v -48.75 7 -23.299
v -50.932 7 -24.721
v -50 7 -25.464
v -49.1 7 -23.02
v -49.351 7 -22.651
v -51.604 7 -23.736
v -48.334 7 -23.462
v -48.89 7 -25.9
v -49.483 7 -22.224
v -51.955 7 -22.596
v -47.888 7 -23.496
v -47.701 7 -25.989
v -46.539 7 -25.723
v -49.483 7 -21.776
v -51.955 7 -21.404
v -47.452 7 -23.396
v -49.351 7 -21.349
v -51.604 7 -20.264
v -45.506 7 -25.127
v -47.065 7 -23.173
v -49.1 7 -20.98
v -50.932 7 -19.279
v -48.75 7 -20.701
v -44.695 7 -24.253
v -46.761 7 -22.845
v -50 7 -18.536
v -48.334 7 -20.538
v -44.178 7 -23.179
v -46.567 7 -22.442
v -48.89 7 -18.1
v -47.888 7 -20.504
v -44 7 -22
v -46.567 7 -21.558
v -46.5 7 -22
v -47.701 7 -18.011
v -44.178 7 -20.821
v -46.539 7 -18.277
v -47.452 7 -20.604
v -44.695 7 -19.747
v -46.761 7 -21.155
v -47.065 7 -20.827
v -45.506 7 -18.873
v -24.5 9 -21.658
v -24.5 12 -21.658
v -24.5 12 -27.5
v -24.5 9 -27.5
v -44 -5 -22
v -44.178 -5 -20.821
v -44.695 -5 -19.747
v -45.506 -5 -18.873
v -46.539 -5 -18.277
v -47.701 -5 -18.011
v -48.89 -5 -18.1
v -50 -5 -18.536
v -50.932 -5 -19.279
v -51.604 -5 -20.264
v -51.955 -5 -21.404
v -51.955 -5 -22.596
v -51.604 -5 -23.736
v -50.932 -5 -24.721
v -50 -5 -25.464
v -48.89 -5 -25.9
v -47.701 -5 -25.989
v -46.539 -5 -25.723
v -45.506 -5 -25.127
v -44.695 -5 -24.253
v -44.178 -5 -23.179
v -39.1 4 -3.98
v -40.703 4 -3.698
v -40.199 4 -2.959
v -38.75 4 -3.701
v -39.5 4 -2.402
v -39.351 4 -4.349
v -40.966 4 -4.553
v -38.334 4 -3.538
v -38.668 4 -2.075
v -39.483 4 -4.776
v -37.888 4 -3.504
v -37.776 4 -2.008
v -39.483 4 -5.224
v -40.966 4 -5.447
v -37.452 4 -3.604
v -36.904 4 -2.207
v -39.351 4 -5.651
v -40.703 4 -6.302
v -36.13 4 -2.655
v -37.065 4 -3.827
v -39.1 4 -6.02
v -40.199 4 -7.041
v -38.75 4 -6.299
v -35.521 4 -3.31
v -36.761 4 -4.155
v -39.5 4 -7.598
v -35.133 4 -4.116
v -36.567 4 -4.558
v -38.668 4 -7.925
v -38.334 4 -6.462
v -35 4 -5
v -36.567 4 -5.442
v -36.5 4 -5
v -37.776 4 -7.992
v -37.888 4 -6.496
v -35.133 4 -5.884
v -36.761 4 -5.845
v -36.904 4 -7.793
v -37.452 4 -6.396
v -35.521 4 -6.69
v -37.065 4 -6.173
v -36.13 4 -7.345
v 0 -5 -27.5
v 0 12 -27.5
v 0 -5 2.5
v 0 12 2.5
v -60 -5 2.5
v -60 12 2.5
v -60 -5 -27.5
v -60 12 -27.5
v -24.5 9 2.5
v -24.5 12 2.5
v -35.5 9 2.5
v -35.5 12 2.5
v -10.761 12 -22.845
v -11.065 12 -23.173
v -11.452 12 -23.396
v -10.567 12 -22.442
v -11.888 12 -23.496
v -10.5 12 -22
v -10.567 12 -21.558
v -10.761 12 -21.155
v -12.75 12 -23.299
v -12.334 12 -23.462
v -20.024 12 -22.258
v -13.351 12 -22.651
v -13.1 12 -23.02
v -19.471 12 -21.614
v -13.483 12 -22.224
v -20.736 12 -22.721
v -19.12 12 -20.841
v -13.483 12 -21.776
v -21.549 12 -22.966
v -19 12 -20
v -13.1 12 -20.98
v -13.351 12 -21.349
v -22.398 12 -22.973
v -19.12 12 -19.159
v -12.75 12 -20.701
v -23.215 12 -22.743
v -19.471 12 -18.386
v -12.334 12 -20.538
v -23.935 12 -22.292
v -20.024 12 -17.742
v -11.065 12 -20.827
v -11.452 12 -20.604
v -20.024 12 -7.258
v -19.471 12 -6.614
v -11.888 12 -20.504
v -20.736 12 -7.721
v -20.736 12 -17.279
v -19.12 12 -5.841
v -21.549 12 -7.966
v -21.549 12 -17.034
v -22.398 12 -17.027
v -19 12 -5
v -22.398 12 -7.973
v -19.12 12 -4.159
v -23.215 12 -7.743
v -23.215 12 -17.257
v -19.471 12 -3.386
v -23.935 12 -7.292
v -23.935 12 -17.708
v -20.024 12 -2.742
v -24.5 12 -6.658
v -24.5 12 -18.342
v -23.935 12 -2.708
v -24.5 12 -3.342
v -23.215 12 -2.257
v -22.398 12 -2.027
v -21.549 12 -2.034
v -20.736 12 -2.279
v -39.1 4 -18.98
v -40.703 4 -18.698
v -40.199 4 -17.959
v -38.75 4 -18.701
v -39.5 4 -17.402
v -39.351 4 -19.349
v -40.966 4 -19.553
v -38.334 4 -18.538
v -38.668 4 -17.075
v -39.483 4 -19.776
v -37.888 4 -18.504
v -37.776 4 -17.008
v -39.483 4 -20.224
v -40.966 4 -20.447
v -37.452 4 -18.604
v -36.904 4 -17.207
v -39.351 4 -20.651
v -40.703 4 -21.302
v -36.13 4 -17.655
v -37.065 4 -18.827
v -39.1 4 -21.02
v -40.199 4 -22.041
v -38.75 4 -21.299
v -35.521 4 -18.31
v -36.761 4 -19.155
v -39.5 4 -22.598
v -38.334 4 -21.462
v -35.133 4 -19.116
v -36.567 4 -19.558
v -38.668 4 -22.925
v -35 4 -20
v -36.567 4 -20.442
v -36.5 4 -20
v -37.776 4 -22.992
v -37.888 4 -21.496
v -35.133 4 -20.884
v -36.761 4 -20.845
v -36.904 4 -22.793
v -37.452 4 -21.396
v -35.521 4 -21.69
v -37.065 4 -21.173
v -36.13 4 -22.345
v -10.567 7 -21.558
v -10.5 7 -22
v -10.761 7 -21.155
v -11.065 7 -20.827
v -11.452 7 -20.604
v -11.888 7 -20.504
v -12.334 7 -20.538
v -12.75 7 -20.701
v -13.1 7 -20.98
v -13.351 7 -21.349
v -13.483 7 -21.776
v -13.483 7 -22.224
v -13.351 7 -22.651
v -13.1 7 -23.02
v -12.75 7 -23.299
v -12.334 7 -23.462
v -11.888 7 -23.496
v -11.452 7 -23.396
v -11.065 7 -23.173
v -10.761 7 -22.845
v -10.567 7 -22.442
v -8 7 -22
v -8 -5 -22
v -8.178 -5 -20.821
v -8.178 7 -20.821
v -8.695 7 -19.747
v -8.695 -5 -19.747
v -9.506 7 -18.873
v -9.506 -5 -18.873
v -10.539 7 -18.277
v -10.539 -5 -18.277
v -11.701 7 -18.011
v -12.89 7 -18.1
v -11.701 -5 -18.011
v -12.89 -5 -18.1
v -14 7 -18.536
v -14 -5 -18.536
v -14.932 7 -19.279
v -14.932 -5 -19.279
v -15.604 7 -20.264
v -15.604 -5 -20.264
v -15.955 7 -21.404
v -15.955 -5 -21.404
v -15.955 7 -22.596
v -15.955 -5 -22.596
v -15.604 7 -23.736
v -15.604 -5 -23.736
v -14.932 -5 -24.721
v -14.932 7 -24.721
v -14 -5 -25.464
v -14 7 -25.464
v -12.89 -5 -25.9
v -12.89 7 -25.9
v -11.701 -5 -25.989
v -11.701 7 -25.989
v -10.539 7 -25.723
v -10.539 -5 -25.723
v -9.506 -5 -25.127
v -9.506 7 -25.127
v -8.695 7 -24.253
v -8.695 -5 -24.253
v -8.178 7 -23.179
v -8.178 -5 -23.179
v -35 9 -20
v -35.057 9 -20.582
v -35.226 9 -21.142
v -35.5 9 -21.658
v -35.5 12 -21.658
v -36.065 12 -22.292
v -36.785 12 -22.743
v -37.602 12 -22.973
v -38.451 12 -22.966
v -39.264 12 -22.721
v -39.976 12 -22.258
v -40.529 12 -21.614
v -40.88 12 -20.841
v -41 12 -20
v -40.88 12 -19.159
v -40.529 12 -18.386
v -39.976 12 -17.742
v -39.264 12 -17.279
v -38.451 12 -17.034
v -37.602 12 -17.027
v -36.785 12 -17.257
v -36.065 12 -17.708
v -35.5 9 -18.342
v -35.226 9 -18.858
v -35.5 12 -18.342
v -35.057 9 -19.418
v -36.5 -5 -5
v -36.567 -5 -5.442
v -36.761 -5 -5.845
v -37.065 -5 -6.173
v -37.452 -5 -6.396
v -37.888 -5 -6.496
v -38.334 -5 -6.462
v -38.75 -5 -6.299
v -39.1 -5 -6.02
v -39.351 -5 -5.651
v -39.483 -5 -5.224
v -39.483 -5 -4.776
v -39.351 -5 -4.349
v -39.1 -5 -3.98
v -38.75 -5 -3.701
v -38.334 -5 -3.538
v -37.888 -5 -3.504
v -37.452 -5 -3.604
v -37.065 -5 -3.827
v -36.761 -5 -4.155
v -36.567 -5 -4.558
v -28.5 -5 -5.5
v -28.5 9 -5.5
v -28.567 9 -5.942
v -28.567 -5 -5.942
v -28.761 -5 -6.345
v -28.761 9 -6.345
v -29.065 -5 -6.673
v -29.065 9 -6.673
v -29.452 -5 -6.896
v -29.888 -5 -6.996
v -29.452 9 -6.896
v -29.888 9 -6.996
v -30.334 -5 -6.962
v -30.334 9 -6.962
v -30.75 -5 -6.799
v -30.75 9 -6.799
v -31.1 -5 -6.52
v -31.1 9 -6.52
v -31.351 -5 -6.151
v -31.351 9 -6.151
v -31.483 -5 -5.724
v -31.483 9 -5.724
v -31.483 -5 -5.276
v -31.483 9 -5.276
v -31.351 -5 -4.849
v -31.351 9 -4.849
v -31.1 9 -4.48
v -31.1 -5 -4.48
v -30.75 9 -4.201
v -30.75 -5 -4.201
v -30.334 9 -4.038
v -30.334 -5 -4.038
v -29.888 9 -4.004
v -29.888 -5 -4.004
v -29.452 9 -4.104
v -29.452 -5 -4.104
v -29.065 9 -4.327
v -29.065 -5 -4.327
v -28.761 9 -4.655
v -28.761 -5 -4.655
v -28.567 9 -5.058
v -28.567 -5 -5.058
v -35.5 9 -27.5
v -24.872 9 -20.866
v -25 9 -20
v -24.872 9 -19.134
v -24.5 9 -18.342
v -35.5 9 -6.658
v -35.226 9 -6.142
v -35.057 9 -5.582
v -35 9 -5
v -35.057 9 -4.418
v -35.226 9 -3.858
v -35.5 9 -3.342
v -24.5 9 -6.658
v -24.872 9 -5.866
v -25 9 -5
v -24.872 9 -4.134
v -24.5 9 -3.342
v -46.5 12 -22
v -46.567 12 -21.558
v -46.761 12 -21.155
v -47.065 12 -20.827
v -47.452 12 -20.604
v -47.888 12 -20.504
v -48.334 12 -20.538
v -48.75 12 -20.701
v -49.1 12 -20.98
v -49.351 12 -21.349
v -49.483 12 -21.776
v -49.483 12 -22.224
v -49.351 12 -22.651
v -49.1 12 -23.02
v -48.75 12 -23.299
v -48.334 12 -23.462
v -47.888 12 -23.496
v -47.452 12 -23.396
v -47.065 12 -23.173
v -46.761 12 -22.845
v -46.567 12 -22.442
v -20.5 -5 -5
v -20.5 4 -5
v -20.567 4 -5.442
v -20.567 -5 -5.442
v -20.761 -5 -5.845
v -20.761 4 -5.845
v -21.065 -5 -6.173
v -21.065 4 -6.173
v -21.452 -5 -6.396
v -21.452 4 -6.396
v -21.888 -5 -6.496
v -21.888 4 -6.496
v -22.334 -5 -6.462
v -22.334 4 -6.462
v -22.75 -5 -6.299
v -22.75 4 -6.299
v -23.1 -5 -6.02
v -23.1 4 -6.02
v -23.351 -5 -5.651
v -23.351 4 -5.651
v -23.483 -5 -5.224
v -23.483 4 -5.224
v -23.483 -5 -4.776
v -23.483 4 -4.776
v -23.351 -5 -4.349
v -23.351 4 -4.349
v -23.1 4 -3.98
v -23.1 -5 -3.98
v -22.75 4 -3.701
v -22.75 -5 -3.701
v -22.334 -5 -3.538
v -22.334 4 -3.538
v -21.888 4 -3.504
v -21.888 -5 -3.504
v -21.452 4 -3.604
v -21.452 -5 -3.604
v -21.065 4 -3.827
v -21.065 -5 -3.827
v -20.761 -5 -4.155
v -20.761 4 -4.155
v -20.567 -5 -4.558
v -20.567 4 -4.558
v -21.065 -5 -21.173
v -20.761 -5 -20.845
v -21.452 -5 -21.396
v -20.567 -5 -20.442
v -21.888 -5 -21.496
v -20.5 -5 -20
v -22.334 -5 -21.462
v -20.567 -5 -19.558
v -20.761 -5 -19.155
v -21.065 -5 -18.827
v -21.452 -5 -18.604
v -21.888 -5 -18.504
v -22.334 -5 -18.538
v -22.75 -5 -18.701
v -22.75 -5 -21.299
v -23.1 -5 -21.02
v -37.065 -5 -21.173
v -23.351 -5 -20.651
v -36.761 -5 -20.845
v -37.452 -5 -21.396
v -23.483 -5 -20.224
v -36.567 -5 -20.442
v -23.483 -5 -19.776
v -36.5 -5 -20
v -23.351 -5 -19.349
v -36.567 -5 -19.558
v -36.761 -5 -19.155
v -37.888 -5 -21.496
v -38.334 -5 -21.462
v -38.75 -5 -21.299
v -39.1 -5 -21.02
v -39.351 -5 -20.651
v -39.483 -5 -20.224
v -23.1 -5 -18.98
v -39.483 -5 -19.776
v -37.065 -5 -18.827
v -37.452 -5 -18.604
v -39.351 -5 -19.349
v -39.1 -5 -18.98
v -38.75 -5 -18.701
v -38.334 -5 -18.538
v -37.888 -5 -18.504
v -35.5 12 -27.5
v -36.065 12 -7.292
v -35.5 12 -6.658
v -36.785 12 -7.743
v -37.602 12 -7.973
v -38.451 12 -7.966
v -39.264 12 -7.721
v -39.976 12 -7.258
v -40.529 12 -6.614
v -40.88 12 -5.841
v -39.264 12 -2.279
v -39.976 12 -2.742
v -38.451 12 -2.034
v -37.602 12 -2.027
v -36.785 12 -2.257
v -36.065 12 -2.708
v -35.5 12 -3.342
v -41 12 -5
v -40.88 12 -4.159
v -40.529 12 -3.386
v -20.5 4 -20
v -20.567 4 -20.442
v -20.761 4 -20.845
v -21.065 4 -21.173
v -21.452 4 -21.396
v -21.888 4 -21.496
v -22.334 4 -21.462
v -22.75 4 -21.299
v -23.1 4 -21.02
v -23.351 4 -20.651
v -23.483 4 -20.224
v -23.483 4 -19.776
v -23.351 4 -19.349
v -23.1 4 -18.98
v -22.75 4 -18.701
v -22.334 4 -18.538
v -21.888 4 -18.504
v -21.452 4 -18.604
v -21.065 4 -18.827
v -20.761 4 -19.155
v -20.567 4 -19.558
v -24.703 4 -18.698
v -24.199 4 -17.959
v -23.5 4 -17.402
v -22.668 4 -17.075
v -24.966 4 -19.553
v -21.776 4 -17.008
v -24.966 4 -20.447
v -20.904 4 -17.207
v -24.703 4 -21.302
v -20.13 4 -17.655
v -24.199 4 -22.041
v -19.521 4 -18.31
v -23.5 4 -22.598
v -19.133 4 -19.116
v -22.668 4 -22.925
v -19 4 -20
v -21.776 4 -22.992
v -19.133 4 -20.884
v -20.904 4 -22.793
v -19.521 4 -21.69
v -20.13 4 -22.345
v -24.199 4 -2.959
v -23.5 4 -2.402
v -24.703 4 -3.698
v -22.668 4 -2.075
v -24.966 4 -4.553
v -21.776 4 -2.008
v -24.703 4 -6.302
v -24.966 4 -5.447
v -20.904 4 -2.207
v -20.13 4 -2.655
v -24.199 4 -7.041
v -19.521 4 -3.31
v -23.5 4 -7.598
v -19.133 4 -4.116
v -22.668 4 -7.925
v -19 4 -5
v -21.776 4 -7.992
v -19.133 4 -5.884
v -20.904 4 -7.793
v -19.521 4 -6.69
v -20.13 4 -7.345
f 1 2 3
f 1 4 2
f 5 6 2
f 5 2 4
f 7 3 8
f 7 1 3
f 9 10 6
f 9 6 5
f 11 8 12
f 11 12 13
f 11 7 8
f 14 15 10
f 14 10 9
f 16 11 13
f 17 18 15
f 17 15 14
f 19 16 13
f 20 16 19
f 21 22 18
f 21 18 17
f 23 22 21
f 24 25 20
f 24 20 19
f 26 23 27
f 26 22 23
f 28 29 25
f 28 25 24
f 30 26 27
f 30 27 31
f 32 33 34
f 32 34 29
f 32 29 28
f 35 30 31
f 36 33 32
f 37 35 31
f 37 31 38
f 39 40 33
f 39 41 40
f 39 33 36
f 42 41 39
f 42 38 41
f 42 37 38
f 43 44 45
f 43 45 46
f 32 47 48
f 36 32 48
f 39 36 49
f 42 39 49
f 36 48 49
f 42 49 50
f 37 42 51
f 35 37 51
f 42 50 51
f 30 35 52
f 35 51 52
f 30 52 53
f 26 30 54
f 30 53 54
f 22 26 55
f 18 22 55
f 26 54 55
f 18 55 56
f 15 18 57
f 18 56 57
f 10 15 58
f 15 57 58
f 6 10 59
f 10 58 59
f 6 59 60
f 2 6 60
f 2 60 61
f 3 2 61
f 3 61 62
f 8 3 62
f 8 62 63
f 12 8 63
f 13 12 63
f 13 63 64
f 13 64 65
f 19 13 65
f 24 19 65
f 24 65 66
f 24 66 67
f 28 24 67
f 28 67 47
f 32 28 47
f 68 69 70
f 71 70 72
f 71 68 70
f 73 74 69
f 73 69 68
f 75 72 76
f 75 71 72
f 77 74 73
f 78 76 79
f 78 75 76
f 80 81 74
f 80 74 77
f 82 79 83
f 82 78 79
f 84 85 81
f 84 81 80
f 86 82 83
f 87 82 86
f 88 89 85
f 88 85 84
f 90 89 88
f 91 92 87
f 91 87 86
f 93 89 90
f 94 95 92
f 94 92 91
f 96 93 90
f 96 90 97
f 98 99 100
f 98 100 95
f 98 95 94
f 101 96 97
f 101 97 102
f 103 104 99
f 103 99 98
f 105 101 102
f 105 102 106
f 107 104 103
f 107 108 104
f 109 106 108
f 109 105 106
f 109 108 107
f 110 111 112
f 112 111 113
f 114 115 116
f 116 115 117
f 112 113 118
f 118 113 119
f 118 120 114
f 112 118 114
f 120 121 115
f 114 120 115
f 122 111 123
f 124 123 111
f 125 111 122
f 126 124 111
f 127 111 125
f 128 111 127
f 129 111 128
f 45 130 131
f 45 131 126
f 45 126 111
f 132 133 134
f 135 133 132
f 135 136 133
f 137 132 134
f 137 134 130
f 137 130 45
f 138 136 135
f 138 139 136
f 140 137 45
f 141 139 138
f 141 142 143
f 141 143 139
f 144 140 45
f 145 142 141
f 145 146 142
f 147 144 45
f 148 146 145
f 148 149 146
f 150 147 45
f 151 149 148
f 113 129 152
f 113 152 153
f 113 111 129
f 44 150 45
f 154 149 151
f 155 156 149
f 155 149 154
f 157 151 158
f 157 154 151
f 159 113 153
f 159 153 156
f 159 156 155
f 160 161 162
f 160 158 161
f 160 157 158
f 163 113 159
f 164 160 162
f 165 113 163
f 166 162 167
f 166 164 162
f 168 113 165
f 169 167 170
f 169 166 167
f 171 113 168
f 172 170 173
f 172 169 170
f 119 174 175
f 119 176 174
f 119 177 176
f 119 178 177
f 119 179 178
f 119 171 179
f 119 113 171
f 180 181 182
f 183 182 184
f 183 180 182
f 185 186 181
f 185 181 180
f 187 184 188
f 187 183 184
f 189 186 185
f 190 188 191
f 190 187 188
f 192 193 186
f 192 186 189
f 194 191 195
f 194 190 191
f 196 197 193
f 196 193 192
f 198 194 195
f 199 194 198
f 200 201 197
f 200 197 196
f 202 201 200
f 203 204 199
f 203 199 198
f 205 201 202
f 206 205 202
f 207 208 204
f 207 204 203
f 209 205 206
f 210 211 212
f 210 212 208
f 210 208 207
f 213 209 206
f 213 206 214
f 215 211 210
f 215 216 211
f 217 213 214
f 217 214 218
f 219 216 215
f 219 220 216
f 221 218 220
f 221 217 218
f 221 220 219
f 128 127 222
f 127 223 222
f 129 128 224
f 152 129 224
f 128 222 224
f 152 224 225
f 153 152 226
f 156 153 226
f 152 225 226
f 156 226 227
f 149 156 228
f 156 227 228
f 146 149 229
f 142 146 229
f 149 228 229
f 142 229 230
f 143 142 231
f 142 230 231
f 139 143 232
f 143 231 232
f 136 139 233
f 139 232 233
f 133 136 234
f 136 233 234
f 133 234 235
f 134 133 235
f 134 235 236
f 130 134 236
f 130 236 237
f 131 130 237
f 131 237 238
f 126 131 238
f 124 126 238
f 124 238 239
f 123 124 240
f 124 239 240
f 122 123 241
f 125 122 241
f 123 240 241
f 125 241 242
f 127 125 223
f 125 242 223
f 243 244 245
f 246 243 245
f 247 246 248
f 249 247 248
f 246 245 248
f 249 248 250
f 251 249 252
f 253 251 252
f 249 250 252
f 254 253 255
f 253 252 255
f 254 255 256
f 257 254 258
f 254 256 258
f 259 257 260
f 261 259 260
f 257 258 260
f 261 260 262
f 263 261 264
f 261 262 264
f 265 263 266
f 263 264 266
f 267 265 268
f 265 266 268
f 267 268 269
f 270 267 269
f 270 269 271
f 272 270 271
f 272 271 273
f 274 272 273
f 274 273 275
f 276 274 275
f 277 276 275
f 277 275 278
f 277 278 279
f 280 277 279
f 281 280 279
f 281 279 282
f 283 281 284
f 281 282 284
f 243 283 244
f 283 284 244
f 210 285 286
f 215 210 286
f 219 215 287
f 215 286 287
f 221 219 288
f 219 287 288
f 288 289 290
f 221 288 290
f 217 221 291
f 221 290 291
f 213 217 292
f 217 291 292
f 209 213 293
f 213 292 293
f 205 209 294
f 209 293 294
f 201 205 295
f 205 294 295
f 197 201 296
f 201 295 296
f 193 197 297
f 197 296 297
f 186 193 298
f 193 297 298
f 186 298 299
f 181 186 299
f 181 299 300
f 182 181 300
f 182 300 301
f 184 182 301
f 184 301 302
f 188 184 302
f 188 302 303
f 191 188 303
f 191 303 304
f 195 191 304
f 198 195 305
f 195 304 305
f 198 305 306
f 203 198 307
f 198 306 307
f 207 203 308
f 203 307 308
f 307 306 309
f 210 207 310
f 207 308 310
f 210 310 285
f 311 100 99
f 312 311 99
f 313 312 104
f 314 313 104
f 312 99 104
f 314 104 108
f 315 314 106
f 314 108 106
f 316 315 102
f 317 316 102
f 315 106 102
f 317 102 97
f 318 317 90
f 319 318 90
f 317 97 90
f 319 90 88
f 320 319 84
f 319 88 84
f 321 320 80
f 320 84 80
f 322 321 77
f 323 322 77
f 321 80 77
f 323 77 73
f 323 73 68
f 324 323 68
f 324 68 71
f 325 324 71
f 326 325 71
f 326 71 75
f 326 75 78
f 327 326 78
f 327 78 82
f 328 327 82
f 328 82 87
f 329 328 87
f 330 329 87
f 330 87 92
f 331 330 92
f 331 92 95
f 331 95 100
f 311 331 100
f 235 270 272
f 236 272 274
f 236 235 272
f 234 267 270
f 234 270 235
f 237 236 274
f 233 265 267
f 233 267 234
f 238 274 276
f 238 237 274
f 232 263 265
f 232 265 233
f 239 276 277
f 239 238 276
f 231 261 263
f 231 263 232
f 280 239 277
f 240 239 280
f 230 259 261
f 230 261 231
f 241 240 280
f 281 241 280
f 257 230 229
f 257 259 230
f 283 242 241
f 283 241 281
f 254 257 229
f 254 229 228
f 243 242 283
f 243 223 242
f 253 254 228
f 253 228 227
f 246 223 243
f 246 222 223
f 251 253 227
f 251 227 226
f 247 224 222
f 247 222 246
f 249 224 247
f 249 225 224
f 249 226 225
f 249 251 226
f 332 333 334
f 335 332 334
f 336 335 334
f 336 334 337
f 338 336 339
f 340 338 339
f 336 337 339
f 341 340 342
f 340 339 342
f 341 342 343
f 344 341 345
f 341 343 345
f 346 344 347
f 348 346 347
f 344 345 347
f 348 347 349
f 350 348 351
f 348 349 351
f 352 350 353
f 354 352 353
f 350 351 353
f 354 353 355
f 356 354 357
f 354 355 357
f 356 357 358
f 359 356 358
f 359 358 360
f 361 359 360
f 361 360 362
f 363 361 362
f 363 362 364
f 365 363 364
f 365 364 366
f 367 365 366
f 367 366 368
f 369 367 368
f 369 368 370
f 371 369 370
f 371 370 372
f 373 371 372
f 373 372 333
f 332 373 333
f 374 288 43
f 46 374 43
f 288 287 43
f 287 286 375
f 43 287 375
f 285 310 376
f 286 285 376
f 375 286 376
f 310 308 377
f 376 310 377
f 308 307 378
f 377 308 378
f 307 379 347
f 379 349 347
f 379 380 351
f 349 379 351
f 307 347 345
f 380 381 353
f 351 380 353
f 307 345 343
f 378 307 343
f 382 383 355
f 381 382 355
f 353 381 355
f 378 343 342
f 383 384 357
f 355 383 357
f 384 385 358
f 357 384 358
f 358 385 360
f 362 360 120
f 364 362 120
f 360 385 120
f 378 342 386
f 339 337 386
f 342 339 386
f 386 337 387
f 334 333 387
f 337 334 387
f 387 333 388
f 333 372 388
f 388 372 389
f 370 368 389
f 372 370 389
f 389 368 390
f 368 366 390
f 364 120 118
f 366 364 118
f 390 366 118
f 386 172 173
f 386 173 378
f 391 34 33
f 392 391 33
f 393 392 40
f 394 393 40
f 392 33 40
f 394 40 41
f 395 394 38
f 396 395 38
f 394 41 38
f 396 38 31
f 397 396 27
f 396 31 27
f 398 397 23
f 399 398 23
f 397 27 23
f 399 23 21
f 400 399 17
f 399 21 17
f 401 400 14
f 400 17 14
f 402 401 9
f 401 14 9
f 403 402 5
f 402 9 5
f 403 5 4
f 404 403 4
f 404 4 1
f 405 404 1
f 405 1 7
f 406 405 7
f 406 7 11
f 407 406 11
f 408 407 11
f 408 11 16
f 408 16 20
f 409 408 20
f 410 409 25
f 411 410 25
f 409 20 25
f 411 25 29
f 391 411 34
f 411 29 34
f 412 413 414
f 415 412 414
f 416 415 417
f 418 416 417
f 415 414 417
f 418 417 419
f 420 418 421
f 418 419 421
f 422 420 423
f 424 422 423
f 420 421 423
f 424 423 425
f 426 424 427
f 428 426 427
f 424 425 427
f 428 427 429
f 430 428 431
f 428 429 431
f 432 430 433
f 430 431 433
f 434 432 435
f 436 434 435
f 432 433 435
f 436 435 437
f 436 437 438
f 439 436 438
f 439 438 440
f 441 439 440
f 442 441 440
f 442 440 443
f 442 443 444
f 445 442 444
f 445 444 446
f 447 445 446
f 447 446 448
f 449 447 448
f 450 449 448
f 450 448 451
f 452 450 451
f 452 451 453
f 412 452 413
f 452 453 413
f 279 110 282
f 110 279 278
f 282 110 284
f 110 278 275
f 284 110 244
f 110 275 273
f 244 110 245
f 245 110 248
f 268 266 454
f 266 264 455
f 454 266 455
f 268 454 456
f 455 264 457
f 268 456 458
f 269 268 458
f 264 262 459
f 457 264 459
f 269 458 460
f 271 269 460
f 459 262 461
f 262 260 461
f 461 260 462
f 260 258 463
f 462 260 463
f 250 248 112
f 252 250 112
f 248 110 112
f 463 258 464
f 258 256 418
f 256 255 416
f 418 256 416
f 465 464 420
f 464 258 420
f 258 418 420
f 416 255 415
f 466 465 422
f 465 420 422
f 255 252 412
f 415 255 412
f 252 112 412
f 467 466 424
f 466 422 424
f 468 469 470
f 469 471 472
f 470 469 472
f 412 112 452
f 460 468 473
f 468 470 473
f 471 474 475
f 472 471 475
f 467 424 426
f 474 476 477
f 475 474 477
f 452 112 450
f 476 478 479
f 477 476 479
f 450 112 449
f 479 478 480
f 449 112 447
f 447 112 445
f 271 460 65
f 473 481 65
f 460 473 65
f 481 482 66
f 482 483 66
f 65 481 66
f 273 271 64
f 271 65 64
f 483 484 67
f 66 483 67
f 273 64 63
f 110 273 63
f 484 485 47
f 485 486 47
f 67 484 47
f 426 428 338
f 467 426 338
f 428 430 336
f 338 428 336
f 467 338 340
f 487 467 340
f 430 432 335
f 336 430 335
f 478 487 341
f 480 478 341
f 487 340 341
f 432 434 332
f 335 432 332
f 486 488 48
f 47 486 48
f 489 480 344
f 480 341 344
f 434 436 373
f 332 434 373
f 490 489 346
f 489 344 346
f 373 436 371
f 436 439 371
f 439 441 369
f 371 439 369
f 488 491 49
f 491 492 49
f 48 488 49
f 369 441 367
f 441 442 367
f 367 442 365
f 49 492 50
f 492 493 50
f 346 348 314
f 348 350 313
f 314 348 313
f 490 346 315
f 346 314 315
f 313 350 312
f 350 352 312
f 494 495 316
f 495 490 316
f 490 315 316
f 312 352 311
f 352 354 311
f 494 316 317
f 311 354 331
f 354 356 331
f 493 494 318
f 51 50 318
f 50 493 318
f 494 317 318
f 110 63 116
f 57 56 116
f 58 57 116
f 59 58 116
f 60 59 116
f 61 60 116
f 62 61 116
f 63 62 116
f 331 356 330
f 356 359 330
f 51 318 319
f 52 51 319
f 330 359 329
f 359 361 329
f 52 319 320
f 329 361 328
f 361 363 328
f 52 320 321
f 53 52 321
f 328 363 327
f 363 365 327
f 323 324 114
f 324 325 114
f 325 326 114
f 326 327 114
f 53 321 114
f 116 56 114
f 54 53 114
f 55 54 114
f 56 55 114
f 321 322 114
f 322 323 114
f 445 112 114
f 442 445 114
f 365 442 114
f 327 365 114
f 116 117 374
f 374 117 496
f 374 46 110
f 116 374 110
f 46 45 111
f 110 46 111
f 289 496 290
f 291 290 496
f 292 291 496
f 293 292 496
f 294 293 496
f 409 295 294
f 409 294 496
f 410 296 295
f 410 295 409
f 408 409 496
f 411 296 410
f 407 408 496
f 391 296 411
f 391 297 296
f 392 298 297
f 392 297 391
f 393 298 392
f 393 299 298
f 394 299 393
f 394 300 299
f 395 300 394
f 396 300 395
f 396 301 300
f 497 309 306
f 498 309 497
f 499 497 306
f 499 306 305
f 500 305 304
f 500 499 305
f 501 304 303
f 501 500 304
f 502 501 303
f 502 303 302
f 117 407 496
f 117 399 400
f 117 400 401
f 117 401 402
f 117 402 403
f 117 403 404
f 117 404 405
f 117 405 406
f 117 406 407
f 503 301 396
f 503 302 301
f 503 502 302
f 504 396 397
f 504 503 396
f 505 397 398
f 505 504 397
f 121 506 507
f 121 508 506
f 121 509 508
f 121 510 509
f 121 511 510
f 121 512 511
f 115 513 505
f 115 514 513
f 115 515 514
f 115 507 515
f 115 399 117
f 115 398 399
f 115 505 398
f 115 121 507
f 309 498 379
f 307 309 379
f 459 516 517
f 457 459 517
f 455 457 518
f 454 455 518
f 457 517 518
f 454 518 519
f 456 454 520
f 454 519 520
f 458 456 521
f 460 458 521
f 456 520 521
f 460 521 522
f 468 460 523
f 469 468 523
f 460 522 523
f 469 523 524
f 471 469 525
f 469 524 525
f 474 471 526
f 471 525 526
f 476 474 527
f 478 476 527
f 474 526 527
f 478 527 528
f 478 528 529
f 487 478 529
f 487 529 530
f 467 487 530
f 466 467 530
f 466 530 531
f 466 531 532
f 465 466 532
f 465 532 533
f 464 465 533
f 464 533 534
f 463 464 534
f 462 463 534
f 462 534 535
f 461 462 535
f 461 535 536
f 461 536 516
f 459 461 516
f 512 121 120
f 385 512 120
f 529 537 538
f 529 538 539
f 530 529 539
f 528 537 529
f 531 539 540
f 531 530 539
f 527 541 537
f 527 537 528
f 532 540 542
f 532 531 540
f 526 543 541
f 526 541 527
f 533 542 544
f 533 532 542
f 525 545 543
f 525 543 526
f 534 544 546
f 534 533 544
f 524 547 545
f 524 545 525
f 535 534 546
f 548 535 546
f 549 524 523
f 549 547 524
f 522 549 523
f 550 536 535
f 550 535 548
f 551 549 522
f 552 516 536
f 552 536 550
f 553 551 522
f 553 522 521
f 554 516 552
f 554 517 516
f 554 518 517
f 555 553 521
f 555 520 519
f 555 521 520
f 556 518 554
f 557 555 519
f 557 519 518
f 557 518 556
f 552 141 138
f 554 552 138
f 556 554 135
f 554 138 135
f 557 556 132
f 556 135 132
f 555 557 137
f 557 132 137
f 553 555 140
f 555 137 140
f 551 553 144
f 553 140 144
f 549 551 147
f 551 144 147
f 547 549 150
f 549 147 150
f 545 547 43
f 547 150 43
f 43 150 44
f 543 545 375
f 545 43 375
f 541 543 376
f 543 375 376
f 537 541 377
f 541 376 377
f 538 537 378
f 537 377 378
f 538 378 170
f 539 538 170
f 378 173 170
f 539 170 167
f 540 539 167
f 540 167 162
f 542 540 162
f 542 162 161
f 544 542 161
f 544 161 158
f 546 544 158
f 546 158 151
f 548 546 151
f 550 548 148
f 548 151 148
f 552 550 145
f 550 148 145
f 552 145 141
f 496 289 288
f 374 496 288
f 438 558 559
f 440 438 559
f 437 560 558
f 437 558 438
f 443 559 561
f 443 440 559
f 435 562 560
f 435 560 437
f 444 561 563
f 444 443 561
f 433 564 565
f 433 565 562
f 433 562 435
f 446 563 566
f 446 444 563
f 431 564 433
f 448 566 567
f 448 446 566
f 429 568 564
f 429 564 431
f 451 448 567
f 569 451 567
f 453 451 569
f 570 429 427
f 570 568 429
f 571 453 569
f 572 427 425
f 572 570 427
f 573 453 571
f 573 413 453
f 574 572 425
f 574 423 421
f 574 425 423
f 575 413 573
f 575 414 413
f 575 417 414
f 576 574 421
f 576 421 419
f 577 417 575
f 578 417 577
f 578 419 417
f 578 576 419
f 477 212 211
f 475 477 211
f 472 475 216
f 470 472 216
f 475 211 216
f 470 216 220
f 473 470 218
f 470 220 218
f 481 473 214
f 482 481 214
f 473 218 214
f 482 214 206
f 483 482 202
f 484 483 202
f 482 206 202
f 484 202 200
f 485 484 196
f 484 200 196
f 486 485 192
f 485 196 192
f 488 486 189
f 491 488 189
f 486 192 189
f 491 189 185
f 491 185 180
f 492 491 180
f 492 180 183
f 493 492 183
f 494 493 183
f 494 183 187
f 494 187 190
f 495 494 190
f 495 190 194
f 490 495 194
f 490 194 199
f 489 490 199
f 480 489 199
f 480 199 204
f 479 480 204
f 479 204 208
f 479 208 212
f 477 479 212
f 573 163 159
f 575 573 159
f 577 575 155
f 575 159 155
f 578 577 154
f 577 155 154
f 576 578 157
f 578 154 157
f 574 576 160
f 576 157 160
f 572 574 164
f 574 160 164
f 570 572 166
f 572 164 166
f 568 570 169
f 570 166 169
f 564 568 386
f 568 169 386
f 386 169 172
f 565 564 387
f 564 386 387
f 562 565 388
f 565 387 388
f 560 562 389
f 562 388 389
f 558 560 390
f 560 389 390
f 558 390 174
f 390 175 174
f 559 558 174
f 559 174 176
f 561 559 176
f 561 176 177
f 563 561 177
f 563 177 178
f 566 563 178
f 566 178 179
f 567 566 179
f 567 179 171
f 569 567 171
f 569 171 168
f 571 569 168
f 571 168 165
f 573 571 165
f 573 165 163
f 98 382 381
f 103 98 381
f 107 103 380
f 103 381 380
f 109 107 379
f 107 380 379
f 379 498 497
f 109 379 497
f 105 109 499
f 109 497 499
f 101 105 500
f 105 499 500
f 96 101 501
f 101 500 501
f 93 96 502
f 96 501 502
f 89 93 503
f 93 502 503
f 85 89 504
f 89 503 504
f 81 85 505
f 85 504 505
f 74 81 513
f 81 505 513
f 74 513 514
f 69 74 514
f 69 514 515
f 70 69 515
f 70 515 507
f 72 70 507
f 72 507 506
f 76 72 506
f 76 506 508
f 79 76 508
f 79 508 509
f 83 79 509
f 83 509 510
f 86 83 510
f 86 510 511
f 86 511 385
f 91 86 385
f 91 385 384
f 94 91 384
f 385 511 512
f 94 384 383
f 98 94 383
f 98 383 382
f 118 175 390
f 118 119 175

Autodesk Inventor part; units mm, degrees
ref_plane "YZ Plane" through (0, 0, 0) normal (1, 0, 0) x (0, 1, 0)
ref_plane "XZ Plane" through (0, 0, 0) normal (0, 1, 0) x (-1, 0, 0)
ref_plane "XY Plane" through (0, 0, 0) normal (0, 0, 1) x (1, 0, 0)
sketch "Sketch1" plane through (0, 0, 0) normal (0, 1, 0) x (-1, 0, 0)
  line L0 (0, 2.5) -> (60, 2.5)
  line L1 (60, 2.5) -> (60, -27.5)
  line L2 (60, -27.5) -> (0, -27.5)
  line L3 (0, -27.5) -> (0, 2.5)
  dimension "d0" = 60
  dimension "d1" = 30
  dimension "d2" = 60
  dimension "d164" = 90
  dimension "d165" = 90
extrude "Extrusion1" add sketch "Sketch1" against normal blind 5 and the other way blind 12
sketch "Sketch2" plane through (0, 12, 0) normal (0, 1, 0) x (1, 0, 0)
  line L0 (-60, 27.5) -> (-60, -2.5) projected
  line L1 (0, 0) -> (0, 30) projected
  line L2 (0, 27.5) -> (-60, 27.5) projected
  line L3 (-60, -2.5) -> (0, -2.5) projected
  line L4 (-5, 0) -> (-5, 30) projected
  point P0 (-40, 7.5)
  point P1 (-20, 7.5)
  dimension "d44" = 10
  dimension "d45" = 20
  dimension "d46" = 20
  dimension "d47" = 10
  dimension "d67" = 15
sketch "Sketch3" plane through (0, 12, 0) normal (0, 1, 0) x (1, 0, 0)
  line L0 (0, 27.5) -> (-60, 27.5) projected
  line L1 (-60, -2.5) -> (-60, 27.5) projected
  point P0 (0, 0)
  point P1 (-50, 22.5)
  point P2 (-5, 30)
  point P3 (-25, 22.5)
  dimension "d56" = 5
  dimension "d57" = 10
  dimension "d58" = 25
  dimension "d59" = 5
sketch "Sketch16" plane through (-60, -5, 2.5) normal (0, 0, 1) x (1, 0, 0)
  line L0 (60, 17) -> (0, 17) projected
  line L1 (24.5, 16.25) -> (24.5, 14)
  line L2 (24.5, 14) -> (35.5, 14)
  line L3 (35.5, 14) -> (35.5, 16.25)
  line L4 (35.5, 17) -> (24.5, 17)
  line L5 (60, 0) -> (0, 0) projected
  line L6 (0, 17) -> (60, 17) projected
  line L7 (24.5, 16.25) -> (24.5, 17)
  line L8 (35.5, 17) -> (35.5, 16.25)
  point P0 (60, 5)
  point P1 (25.5, 17)
  point P2 (30, 17)
  point P3 (30, 0)
  point P4 (30, 17)
  point P5 (30, 0)
  point P6 (30, 17)
  point P7 (30, 0)
  dimension "d90" = 1
  dimension "d92" = 2.25
  dimension "d93" = 11
extrude "Extrusion6" cut sketch "Sketch16" against normal up to next
sketch "Sketch17" plane through (-35.5, 9, 2.5) normal (0, 1, 0) x (1, 0, 0)
  circle A0 centre (5.5, 8) radius 1.5
  line L0 (0, 30) -> (11, 30) projected
  line L1 (11, 0) -> (0, 0) projected
  point P0 (35.5, 2.5)
  point P1 (5.5, 30)
  dimension "d97" = 3
  dimension "d155" = 8
extrude "Extrusion7" cut sketch "Sketch17" against normal up to next
ref_plane "Work Plane2" through (0, 15.5, 0) normal (0, 1, 0) x (1, 0, 0)
sketch "Sketch21" plane through (0, -5, 0) normal (0, -1, 0) x (1, 0, 0)
  circle A0 centre (-12, -22) radius 4
  circle A1 centre (-48, -22) radius 4
  point P0 (0, 0)
  dimension "d125" = 8
  dimension "d131" = 8
extrude "Extrusion13" cut sketch "Sketch21" against normal blind 12
sketch "Sketch23" plane through (-12, 7, -22) normal (0, -1, 0) x (1, 0, 0)
  circle A0 centre (0, 0) radius 1.5
  circle A1 centre (-36, 0) radius 1.5
  point P0 (12, 22)
  dimension "d134" = 3
  dimension "d135" = 3
extrude "Extrusion14" cut sketch "Sketch23" against normal up to next
sketch "Sketch25" plane through (0, 12, 0) normal (0, 1, 0) x (1, 0, 0)
  circle A0 centre (-22, 5) radius 1.5
  circle A1 centre (-22, 20) radius 1.5
  circle A2 centre (-38, 20) radius 1.5
  circle A3 centre (-38, 5) radius 1.5
  line L0 (-60, -2.5) -> (0, -2.5) projected
  line L1 (-60, 27.5) -> (-60, -2.5) projected
  point P0 (0, 0)
  point P1 (-34.5, 0)
  dimension "d145" = 3
  dimension "d146" = 3
  dimension "d147" = 3
  dimension "d148" = 3
  dimension "d149" = 16
  dimension "d150" = 15
  dimension "d151" = 7.5
  dimension "d152" = 22
extrude "Extrusion16" cut sketch "Sketch25" against normal up to next
sketch "Sketch26" plane through (0, 12, 0) normal (0, 1, 0) x (1, 0, 0)
  circle A0 centre (-38, 20) radius 3
  circle A1 centre (-22, 20) radius 3
  circle A2 centre (-38, 5) radius 3
  circle A3 centre (-22, 5) radius 3
  line L0 (-60, -2.5) -> (-35.5, -2.5) projected
  point P0 (0, 0)
  dimension "d156" = 6
  dimension "d157" = 6
  dimension "d160" = 6
  dimension "d161" = 6
  dimension "d166" = 15
  dimension "d167" = 16
  dimension "d168" = 7.5
extrude "Extrusion18" cut sketch "Sketch26" against normal blind 8
sketch "Sketch11" plane through (0, 12, 0) normal (0, 1, 0) x (1, 0, 0)
  point P0 (-20, 10)
  point P1 (-40, 10)
properties part number "detalKKoretke"
